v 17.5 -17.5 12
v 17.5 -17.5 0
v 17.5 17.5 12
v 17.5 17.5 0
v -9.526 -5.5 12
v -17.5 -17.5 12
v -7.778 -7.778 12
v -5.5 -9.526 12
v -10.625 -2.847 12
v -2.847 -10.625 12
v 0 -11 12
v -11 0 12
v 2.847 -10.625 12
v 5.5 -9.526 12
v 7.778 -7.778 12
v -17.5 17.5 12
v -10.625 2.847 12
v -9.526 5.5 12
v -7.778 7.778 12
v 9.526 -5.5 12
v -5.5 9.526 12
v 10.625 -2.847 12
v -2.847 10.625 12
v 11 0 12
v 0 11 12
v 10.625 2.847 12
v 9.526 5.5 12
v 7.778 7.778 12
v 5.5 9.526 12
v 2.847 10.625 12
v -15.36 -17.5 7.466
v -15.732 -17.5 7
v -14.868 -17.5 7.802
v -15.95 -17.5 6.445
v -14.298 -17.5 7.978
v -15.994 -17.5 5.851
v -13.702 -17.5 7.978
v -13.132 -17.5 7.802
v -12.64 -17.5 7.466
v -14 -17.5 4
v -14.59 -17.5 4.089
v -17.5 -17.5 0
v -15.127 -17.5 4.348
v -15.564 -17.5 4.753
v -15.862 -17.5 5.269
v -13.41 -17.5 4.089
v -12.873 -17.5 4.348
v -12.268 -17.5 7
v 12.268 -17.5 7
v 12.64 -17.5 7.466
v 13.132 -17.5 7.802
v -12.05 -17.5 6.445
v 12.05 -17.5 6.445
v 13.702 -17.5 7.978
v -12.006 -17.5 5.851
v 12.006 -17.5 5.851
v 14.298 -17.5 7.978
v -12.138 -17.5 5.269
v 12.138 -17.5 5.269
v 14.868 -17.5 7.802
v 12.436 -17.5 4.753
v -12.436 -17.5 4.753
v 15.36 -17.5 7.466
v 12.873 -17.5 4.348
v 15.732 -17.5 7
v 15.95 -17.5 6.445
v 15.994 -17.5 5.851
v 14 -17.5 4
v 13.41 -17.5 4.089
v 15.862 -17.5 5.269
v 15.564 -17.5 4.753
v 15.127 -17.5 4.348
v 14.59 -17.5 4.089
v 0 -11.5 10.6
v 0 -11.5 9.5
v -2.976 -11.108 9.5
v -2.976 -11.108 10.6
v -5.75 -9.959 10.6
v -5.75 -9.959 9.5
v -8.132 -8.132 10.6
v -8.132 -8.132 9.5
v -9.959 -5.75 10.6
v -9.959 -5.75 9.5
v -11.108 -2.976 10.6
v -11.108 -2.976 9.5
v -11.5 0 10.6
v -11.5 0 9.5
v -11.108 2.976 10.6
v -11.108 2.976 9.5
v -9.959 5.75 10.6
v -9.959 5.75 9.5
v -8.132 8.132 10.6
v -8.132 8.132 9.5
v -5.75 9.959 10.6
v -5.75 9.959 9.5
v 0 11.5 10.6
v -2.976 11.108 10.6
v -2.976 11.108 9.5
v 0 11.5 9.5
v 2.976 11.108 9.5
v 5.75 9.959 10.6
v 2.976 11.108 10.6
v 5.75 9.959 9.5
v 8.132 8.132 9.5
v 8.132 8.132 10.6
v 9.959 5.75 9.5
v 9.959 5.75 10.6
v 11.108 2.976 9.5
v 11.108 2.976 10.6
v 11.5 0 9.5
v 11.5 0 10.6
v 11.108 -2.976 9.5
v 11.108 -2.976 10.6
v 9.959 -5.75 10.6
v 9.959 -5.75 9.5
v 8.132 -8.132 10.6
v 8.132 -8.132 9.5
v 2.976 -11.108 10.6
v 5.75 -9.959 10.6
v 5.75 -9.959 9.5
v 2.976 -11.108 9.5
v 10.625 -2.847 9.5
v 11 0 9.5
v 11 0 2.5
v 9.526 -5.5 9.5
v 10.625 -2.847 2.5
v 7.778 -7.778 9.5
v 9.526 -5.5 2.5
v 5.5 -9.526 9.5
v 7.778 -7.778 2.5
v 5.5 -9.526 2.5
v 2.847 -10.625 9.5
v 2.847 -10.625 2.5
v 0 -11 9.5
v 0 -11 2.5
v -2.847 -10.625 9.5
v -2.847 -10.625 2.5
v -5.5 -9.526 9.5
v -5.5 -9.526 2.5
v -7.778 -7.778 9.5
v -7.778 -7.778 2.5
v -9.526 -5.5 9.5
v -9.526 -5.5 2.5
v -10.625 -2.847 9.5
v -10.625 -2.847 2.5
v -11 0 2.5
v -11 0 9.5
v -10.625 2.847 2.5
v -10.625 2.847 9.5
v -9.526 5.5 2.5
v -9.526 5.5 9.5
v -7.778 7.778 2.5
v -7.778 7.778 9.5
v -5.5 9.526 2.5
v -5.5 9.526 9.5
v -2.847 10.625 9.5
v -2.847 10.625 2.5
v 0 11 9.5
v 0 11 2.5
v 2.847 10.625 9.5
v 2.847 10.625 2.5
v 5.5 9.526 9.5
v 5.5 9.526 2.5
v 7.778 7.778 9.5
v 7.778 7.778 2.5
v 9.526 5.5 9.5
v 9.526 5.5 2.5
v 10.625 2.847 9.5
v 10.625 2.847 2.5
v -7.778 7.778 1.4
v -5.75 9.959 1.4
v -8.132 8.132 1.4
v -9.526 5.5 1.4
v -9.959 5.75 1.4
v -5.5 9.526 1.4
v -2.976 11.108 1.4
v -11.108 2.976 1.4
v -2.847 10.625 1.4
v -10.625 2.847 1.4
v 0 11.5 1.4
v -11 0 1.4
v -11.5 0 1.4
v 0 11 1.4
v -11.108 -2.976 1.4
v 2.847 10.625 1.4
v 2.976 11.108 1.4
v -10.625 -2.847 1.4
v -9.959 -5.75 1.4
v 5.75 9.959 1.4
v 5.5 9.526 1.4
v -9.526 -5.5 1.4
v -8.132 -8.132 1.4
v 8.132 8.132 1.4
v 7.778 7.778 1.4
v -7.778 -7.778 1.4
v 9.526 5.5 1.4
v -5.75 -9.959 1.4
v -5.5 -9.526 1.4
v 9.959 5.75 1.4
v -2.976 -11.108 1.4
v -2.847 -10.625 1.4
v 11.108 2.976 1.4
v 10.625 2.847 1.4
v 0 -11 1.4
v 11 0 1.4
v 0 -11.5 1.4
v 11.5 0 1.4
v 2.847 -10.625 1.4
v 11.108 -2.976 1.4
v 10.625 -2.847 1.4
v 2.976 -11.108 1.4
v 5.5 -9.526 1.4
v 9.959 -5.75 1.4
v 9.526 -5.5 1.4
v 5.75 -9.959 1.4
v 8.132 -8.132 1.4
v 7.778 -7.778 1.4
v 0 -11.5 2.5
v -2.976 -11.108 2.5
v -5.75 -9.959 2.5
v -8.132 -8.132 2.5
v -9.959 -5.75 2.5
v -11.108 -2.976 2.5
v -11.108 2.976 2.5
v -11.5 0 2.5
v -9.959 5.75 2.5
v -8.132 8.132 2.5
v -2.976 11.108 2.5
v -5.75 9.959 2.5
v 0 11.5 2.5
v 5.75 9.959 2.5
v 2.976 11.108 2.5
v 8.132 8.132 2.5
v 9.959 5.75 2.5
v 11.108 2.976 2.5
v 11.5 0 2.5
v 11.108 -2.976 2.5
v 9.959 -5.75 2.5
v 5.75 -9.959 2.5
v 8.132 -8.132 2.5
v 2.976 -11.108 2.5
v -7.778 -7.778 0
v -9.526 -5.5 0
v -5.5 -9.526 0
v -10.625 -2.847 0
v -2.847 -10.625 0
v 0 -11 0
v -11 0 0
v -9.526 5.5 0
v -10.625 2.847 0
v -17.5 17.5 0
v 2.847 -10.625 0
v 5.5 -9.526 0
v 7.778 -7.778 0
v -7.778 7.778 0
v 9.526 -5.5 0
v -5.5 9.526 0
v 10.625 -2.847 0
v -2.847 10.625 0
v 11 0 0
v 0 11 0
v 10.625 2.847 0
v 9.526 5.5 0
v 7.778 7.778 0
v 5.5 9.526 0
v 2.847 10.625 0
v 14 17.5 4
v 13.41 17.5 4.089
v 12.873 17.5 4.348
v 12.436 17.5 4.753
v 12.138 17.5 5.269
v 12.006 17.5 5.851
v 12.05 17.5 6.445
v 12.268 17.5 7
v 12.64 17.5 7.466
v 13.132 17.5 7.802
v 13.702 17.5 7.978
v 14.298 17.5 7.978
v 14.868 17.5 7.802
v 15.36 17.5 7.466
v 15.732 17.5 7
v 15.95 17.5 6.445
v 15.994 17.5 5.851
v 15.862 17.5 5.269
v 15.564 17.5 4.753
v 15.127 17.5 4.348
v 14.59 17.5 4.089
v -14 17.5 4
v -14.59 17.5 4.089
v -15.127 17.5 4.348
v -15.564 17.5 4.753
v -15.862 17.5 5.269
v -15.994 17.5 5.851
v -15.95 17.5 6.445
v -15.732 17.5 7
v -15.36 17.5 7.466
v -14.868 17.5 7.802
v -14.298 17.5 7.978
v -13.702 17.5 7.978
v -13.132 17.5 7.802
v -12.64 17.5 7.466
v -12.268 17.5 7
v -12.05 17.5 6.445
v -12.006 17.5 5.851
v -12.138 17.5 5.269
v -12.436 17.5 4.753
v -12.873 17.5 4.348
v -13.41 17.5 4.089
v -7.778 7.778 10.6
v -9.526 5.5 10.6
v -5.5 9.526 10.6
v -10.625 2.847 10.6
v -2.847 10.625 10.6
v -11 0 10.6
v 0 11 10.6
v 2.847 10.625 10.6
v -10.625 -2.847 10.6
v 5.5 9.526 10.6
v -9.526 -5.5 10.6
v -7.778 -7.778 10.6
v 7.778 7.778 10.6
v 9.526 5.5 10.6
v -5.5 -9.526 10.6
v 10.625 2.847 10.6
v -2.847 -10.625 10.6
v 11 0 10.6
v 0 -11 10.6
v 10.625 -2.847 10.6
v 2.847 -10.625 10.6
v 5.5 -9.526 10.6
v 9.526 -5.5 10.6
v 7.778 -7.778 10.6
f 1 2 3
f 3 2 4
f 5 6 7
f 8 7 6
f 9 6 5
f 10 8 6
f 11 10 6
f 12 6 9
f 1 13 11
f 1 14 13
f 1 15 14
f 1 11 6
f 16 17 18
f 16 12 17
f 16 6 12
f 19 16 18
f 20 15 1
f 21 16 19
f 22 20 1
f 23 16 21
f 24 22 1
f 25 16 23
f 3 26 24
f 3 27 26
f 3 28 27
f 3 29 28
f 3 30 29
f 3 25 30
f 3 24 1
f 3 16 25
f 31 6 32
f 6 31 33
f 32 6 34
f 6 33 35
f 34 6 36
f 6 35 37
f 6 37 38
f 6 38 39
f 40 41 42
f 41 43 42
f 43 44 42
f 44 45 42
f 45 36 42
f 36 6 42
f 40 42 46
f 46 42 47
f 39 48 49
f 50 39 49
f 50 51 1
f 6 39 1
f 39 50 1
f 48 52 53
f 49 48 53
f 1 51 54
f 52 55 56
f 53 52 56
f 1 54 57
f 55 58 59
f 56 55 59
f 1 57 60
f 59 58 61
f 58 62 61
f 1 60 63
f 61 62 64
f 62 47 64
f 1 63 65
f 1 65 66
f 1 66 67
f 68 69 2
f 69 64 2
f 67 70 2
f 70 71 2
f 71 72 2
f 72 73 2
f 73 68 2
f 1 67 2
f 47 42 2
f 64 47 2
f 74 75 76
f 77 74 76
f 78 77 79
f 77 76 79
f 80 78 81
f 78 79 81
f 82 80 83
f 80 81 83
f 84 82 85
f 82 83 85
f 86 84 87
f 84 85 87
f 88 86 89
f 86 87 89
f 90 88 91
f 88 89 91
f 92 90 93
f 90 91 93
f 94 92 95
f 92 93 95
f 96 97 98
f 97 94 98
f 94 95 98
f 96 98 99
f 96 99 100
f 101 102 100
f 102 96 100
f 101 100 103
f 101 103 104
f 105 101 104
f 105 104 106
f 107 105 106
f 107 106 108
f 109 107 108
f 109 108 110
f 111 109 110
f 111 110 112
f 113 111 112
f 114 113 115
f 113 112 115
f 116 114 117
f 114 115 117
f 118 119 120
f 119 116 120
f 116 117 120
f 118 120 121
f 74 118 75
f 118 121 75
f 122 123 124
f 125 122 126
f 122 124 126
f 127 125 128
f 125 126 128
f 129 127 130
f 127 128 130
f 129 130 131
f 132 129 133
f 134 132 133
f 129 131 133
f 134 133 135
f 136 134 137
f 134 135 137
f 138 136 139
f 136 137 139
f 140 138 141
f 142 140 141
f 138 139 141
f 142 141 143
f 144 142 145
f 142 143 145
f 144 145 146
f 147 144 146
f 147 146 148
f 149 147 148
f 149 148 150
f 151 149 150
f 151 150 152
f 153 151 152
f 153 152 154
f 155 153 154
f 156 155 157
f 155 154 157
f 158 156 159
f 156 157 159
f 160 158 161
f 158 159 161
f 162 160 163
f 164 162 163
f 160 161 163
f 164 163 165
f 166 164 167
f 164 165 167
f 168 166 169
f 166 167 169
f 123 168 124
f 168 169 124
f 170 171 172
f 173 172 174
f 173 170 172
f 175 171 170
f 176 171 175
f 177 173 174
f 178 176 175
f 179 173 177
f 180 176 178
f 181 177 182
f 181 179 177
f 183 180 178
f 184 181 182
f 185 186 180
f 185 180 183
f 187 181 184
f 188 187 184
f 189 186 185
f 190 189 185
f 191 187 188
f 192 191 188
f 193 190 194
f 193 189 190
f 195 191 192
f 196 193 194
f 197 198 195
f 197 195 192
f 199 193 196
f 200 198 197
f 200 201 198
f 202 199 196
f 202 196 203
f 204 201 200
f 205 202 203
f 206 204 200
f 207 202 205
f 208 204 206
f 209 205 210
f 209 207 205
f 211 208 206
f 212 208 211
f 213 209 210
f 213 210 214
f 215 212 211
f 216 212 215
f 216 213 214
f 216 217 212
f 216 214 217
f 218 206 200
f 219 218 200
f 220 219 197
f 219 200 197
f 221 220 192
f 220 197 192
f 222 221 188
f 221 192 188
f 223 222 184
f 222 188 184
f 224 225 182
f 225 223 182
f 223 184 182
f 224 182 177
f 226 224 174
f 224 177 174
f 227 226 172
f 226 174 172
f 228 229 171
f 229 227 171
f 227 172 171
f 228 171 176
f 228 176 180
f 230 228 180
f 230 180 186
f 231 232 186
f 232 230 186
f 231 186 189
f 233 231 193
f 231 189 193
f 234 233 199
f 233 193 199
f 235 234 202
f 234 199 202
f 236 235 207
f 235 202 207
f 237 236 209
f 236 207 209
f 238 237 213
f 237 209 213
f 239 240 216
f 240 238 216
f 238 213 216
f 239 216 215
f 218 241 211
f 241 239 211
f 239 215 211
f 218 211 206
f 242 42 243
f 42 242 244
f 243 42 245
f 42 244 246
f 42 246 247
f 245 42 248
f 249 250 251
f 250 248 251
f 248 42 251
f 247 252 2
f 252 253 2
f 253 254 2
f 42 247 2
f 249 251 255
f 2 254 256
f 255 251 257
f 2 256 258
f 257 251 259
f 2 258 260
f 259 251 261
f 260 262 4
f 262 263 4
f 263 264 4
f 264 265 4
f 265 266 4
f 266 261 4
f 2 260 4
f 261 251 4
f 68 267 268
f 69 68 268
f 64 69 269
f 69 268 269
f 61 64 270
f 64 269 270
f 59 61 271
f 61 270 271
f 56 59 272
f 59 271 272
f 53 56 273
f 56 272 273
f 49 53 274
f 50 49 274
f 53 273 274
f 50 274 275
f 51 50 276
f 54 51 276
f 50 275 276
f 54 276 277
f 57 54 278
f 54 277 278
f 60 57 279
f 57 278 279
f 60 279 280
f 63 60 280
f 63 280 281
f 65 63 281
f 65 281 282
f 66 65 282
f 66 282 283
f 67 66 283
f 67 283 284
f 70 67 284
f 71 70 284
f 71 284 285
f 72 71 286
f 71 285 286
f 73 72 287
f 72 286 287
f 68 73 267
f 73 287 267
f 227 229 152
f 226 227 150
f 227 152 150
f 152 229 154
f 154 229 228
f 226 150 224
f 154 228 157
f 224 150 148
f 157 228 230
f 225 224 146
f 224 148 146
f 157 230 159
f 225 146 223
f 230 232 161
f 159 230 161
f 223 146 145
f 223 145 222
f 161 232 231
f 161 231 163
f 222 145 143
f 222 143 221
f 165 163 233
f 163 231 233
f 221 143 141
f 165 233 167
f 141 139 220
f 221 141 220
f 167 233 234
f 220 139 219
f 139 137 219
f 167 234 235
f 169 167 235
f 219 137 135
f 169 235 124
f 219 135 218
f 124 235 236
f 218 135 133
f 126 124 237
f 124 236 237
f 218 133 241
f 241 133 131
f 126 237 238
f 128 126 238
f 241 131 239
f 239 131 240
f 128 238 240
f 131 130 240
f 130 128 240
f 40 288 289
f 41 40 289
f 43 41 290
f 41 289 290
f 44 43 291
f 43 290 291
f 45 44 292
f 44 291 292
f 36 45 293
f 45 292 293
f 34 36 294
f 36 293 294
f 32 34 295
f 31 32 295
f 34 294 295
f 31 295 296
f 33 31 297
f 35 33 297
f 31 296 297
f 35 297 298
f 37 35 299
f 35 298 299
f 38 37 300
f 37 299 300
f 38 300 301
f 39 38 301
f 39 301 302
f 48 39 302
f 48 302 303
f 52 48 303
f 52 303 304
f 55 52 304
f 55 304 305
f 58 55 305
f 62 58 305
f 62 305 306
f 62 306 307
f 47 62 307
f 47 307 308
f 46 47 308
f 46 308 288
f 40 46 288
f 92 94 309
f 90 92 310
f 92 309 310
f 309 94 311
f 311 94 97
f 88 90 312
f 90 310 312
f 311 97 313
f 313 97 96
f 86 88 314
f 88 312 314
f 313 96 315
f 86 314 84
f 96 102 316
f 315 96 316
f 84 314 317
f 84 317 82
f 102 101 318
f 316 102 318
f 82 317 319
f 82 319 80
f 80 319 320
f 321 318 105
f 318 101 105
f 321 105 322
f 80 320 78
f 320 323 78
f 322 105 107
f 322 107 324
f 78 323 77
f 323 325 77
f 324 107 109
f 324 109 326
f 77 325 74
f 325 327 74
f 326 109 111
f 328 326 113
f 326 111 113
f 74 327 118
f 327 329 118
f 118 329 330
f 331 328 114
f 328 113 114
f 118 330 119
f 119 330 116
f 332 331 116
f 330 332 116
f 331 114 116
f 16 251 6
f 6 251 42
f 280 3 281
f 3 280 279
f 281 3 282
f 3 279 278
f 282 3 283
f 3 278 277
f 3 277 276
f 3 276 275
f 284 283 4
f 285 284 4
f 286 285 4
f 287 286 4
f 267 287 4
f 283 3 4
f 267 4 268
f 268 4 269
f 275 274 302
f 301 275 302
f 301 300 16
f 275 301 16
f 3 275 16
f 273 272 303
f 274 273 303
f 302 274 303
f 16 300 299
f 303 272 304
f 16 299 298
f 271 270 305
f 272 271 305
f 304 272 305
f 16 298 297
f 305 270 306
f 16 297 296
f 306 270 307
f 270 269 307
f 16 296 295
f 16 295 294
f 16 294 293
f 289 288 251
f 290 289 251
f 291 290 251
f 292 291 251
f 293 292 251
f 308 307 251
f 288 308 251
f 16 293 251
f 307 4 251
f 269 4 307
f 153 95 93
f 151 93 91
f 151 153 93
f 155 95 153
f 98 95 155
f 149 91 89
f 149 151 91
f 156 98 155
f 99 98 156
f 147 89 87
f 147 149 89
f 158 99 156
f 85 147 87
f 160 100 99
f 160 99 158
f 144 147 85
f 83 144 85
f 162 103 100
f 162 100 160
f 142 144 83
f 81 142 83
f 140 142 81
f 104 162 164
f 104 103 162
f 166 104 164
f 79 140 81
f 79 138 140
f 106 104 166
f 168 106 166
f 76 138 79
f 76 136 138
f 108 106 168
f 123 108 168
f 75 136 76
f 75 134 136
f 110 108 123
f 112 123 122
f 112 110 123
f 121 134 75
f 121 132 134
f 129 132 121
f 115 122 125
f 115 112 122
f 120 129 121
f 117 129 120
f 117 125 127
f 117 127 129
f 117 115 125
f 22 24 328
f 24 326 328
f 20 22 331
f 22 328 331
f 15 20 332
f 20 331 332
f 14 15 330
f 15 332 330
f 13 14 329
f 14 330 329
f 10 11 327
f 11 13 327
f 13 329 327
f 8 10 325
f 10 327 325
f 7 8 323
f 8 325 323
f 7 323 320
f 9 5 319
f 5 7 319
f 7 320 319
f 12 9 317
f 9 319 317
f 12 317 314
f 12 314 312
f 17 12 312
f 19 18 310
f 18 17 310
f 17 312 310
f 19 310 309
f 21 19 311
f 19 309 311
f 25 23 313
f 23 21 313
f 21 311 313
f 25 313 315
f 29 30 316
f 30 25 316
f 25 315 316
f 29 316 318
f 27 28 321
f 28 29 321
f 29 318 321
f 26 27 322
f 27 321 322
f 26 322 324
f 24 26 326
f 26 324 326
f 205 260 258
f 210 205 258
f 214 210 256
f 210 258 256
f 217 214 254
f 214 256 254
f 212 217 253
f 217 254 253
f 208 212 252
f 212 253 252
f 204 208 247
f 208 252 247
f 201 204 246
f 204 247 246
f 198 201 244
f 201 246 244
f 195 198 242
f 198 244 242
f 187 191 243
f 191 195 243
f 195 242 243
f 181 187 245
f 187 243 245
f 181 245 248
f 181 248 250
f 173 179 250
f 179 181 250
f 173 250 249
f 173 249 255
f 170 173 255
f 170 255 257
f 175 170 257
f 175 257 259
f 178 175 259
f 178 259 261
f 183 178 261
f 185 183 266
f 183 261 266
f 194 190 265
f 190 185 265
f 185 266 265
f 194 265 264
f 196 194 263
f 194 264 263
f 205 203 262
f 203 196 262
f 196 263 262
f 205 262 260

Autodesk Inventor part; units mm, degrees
ref_plane "YZ Plane" through (0, 0, 0) normal (1, 0, 0) x (0, 1, 0)
ref_plane "XZ Plane" through (0, 0, 0) normal (0, 1, 0) x (-1, 0, 0)
ref_plane "XY Plane" through (0, 0, 0) normal (0, 0, 1) x (1, 0, 0)
sketch "Szkic1" plane through (0, 0, 0) normal (0, 0, 1) x (1, 0, 0)
  circle A0 centre (0, 0) radius 11
  line L0 (-17.5, -17.5) -> (17.5, -17.5)
  line L1 (17.5, -17.5) -> (17.5, 17.5)
  line L2 (17.5, 17.5) -> (-17.5, 17.5)
  line L3 (-17.5, 17.5) -> (-17.5, -17.5)
  line L4 (-17.5, -17.5) -> (17.5, 17.5) construction
  line L5 (17.5, -17.5) -> (-17.5, 17.5) construction
  dimension "d0" = 22
  dimension "d1" = 35
extrude "Wyciągnięcie proste1" add sketch "Szkic1" along normal blind 12
sketch "Szkic2" plane through (0, 0, 0) normal (1, 0, 0) x (0, 1, 0)
  line L0 (-11, 12) -> (11, 12) projected
  line L1 (11, 0) -> (-11, 0) projected
  line L2 (-11, 0) -> (-11, 12) projected
  line L3 (-11, 10.6) -> (-11.5, 10.6)
  line L4 (-11.5, 10.6) -> (-11.5, 9.5)
  line L5 (-11.5, 9.5) -> (-11, 9.5)
  line L6 (-11, 9.5) -> (-11, 10.6)
  line L7 (11, 0) -> (11, 12) construction
  line L8 (11, 6) -> (-11, 6) construction
  line L9 (-11, 2.5) -> (-11.5, 2.5)
  line L10 (-11.5, 2.5) -> (-11.5, 1.4)
  line L11 (-11.5, 1.4) -> (-11, 1.4)
  line L12 (-11, 1.4) -> (-11, 2.5)
  line L13 (0, 0) -> (0, 12) construction
  dimension "d4" = 1.1
  dimension "d5" = 0.5
  dimension "d8" = 7
revolve "Obrót1" cut sketch "Szkic2" angle 360 about axis through (0, 0, 0) along (0, 0, 1)
sketch "Szkic3" plane through (-17.5, -17.5, 0) normal (0, -1, 0) x (1, 0, 0)
  line L0 (0, 0) -> (35, 0) projected
  line L1 (35, 0) -> (35, 12) projected
  line L2 (0, 12) -> (35, 12) projected
  line L3 (0, 0) -> (0, 12) projected
  line L4 (35, 6) -> (0, 6) construction
  line L5 (0, 12) -> (35, 12) construction
  line L6 (17.5, 12) -> (17.5, 0) construction
  point P0 (31.5, 6)
  point P1 (3.5, 6)
  dimension "d9" = 28
hole "Otwór1" at (14, -17.5, 6) at (-14, -17.5, 6) direction (0, 1, 0) diameter 4 end through all
properties part number "bearing"
